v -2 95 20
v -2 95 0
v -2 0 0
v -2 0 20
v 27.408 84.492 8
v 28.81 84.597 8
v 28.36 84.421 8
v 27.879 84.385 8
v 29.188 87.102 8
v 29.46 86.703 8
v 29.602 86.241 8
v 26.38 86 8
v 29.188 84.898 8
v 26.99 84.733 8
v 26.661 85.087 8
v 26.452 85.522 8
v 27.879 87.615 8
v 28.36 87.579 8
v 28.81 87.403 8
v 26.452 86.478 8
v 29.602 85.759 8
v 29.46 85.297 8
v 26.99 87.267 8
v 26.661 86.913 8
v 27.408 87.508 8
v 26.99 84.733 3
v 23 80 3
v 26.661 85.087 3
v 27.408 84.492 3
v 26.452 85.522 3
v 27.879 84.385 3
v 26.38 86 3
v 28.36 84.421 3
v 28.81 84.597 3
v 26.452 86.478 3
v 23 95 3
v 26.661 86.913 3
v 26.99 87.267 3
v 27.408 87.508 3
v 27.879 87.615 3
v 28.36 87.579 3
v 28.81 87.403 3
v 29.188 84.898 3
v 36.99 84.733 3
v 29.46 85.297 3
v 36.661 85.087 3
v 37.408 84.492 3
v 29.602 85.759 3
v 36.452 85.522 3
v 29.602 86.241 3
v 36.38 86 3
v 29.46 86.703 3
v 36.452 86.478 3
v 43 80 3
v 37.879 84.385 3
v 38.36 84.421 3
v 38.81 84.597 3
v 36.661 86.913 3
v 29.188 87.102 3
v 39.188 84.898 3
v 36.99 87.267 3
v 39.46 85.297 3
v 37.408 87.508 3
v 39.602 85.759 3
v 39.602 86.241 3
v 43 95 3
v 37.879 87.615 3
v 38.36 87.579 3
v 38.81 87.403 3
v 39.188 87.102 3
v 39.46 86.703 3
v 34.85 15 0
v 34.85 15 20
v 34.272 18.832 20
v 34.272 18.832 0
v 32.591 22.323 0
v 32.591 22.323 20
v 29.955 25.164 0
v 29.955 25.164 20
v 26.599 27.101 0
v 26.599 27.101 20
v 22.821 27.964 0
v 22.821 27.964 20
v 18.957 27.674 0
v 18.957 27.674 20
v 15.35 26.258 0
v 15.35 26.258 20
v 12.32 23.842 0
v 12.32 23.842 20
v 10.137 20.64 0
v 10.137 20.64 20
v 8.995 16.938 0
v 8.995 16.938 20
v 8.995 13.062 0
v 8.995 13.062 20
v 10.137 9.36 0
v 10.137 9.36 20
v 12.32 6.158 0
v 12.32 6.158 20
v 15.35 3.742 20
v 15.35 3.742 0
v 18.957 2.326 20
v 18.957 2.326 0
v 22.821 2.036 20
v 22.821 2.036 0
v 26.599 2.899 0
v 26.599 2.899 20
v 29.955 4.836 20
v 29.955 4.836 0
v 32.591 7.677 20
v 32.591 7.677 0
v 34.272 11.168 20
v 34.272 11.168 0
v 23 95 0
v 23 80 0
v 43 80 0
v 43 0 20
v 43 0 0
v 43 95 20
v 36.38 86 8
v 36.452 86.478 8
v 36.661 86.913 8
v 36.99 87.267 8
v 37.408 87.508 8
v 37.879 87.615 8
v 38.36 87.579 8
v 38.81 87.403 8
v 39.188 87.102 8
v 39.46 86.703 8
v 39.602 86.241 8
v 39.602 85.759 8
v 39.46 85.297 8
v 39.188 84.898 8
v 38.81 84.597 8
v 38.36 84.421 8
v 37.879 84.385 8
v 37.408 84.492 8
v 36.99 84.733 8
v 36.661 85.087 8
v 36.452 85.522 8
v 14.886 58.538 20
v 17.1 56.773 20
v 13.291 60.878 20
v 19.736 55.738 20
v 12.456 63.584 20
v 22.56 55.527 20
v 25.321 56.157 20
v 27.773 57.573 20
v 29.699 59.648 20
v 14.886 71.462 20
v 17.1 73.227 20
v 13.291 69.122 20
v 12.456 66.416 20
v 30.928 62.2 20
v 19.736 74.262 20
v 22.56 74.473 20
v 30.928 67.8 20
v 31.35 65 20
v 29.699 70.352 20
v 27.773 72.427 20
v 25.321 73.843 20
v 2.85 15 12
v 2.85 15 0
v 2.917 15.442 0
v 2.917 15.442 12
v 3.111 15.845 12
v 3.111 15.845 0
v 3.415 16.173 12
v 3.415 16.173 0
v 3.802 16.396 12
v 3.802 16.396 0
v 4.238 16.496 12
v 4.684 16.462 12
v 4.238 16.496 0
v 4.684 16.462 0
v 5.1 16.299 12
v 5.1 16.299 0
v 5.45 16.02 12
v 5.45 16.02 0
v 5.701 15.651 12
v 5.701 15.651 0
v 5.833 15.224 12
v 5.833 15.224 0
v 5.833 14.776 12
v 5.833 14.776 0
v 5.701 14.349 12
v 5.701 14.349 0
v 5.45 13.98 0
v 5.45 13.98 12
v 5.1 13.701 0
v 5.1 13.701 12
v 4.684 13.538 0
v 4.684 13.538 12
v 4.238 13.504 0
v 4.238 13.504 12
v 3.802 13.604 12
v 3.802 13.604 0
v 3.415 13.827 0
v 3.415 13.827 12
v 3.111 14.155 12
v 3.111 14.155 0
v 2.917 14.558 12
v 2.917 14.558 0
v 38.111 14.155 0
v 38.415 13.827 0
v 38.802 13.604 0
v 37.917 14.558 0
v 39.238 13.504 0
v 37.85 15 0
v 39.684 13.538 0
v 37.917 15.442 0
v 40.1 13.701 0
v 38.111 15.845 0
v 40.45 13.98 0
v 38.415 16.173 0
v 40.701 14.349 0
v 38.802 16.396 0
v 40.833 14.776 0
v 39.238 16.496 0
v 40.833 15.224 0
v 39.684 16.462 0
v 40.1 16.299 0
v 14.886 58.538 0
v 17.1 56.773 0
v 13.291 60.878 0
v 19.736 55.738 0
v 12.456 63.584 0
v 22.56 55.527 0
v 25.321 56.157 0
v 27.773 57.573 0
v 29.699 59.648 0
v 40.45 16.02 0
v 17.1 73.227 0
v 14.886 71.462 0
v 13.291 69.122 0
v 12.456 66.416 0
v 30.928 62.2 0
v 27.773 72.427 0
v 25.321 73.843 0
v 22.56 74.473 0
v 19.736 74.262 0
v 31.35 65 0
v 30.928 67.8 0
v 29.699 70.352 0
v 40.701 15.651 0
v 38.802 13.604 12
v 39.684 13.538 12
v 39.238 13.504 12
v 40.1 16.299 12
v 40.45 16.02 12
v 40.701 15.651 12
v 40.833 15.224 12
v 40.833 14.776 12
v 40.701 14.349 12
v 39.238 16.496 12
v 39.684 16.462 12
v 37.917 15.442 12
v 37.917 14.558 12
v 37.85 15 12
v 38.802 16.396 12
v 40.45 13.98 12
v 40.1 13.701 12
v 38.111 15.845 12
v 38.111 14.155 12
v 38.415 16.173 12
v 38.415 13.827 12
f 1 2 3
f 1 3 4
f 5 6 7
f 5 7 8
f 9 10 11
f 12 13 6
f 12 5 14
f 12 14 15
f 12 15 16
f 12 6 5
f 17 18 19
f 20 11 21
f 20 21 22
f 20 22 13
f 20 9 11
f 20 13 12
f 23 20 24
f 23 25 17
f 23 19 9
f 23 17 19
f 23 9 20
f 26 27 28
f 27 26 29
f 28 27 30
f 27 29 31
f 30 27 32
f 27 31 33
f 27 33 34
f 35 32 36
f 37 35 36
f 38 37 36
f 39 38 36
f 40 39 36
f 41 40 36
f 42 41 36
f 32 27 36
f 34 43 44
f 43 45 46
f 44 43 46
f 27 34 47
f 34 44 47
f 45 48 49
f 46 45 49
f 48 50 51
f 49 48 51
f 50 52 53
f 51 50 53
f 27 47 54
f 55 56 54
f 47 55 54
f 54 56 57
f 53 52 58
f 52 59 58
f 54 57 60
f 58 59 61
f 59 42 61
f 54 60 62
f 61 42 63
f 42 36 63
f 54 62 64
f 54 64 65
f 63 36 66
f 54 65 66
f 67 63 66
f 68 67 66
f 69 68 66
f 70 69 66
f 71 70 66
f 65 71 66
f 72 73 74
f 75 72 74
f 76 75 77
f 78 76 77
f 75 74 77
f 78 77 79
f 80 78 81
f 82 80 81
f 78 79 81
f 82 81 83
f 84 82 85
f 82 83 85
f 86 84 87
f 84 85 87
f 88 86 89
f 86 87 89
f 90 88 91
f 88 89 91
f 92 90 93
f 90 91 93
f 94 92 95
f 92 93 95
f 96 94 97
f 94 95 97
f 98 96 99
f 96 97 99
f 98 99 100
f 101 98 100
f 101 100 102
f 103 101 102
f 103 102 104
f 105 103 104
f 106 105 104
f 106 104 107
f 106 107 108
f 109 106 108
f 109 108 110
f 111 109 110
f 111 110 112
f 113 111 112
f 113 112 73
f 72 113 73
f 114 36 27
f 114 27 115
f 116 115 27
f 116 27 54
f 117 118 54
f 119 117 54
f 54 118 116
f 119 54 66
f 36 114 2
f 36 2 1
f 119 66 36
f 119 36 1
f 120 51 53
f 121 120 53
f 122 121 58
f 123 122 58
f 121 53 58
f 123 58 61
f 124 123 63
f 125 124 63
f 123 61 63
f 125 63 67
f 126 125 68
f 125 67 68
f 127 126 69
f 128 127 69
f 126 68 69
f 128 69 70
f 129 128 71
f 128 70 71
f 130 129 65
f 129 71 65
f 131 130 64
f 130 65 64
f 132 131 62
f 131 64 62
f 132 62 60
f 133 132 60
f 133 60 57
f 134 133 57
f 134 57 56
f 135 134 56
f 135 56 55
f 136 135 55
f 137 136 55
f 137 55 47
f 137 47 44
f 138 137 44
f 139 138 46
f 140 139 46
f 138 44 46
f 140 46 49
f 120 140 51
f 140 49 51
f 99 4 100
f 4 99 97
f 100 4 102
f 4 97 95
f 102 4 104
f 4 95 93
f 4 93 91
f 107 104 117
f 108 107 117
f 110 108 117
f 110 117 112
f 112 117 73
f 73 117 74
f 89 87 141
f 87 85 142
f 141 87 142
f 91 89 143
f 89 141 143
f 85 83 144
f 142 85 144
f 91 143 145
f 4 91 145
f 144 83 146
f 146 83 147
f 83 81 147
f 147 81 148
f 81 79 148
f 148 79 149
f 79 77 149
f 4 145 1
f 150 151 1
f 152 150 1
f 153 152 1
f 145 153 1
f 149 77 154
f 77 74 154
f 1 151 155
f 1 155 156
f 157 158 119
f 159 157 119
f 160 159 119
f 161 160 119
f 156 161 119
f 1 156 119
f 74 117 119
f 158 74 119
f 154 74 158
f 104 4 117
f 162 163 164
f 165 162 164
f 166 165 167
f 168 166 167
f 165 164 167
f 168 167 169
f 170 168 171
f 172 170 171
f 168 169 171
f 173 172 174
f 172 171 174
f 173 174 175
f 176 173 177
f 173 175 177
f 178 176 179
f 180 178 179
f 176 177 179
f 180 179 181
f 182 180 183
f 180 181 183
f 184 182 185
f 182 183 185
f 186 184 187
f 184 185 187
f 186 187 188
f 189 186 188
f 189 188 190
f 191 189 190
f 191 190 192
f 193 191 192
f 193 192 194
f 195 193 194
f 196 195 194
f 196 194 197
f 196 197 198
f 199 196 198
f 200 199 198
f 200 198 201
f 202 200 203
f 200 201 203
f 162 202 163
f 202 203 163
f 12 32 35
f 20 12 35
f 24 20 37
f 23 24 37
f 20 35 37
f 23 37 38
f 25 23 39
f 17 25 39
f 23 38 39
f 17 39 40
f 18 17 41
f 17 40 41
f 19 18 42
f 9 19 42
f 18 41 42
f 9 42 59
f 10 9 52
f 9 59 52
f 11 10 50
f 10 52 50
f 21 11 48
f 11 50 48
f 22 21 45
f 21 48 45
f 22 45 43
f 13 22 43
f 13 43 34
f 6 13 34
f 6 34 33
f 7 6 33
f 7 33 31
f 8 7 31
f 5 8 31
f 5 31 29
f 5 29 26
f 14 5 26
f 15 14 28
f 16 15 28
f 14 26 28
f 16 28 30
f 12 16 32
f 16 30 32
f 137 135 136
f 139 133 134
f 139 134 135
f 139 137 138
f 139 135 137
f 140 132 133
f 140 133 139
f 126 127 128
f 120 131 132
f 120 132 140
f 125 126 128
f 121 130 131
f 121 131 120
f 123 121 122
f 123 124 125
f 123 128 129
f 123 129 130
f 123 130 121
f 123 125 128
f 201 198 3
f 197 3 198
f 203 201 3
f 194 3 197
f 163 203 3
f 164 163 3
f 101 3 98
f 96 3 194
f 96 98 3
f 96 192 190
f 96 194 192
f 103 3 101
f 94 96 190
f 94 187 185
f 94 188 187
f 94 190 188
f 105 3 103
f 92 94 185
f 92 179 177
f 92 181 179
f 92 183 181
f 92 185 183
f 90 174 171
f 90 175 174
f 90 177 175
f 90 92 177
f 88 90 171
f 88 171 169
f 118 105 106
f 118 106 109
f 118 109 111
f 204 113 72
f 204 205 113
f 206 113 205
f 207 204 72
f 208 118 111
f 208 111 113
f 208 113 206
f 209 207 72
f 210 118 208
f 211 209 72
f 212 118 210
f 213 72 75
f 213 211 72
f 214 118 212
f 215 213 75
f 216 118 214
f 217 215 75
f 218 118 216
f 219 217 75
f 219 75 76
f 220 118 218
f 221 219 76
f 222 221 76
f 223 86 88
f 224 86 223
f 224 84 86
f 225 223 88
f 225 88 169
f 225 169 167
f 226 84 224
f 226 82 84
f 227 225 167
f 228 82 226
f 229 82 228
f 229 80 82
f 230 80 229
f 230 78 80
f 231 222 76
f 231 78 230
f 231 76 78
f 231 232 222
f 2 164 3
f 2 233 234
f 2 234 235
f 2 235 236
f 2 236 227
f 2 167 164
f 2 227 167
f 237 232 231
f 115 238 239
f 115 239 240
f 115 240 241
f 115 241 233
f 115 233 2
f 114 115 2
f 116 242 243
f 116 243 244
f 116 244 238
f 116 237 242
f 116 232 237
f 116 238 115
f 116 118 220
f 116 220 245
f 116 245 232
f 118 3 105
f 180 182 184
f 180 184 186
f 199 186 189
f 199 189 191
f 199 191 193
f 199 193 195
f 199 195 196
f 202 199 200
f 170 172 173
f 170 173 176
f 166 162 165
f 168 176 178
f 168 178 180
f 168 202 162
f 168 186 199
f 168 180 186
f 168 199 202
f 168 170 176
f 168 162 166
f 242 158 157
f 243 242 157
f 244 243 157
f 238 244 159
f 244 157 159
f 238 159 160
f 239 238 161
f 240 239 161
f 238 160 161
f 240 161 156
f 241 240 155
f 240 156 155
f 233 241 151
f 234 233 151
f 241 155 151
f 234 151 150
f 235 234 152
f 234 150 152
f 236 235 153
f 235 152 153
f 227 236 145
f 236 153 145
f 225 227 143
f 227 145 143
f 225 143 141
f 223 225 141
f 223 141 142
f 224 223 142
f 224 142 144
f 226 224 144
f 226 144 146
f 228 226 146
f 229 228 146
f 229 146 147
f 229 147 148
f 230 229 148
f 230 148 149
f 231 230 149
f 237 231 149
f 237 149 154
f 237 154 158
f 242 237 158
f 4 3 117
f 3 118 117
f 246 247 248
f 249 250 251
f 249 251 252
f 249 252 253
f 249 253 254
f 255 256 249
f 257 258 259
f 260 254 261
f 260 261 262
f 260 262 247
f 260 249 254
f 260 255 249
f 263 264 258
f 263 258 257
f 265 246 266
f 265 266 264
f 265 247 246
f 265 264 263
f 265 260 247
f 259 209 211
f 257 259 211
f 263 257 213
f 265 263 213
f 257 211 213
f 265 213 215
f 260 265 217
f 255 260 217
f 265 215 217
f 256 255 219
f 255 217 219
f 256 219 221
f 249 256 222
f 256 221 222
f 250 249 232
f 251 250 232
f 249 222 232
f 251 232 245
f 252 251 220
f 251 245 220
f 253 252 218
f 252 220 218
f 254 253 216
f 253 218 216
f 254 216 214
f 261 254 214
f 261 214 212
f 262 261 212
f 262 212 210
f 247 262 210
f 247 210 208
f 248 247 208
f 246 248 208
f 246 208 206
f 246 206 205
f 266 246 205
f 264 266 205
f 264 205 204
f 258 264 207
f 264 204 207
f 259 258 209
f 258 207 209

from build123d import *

# Parameters (mm, degrees)
SKIZZE1_W                       = 43
SKIZZE1_H                       = 95
AUFSATZ_LINEAR_AUSTRAGEN1_DEPTH = 20
SKIZZE2_R                       = 13
SCHNITT_LINEAR_AUSTRAGEN1_DEPTH = 34
SKIZZE3_R                       = 9.5
SCHNITT_LINEAR_AUSTRAGEN2_DEPTH = 34
SKIZZE4_W                       = 20
SKIZZE4_H                       = 3
SCHNITT_LINEAR_AUSTRAGEN3_DEPTH = 15
SKIZZE8_R                       = 1.62
SCHNITT_LINEAR_AUSTRAGEN6_DEPTH = 5
SKIZZE9_R                       = 1.62
SCHNITT_LINEAR_AUSTRAGEN7_DEPTH = 5
SKIZZE10_R                      = 1.5
SCHNITT_LINEAR_AUSTRAGEN8_DEPTH = 12
SKIZZE11_W                      = 20
SKIZZE11_H                      = 95
AUFSATZ_LINEAR_AUSTRAGEN2_DEPTH = 2


with BuildPart() as part:
    # Skizze1 → Aufsatz-Linear austragen1 (new body)
    with BuildSketch(Plane.XY):
        with Locations((21.5, 47.5)):
            Rectangle(SKIZZE1_W, SKIZZE1_H)
    extrude(amount=AUFSATZ_LINEAR_AUSTRAGEN1_DEPTH)

    # Skizze2 → Schnitt-Linear austragen1 (cut)
    with BuildSketch(Plane.XY.offset(20)):
        with Locations((21.85, 15)):
            Circle(SKIZZE2_R)
    extrude(amount=-SCHNITT_LINEAR_AUSTRAGEN1_DEPTH, mode=Mode.SUBTRACT)

    # Skizze3 → Schnitt-Linear austragen2 (cut)
    with BuildSketch(Plane.XY.offset(20)):
        with Locations((21.85, 65)):
            Circle(SKIZZE3_R)
    extrude(amount=-SCHNITT_LINEAR_AUSTRAGEN2_DEPTH, mode=Mode.SUBTRACT)

    # Skizze4 → Schnitt-Linear austragen3 (cut)
    with BuildSketch(Plane(origin=(0, 95, 0), x_dir=(1, 0, 0), z_dir=(0, 1, 0))):
        with Locations((33, -1.5)):
            Rectangle(SKIZZE4_W, SKIZZE4_H)
    extrude(amount=-SCHNITT_LINEAR_AUSTRAGEN3_DEPTH, mode=Mode.SUBTRACT)

    # Skizze8 → Schnitt-Linear austragen6 (cut)
    with BuildSketch(Plane(origin=(0, 0, 3), x_dir=(-1, 0, 0), z_dir=(0, 0, -1))):
        with Locations((-38, 86)):
            Circle(SKIZZE8_R)
    extrude(amount=-SCHNITT_LINEAR_AUSTRAGEN6_DEPTH, mode=Mode.SUBTRACT)

    # Skizze9 → Schnitt-Linear austragen7 (cut)
    with BuildSketch(Plane(origin=(0, 0, 3), x_dir=(-1, 0, 0), z_dir=(0, 0, -1))):
        with Locations((-28, 86)):
            Circle(SKIZZE9_R)
    extrude(amount=-SCHNITT_LINEAR_AUSTRAGEN7_DEPTH, mode=Mode.SUBTRACT)

    # Skizze10 → Schnitt-Linear austragen8 (cut)
    with BuildSketch(Plane(origin=(0, 0, 0), x_dir=(-1, 0, 0), z_dir=(0, 0, -1))):
        with Locations((-4.35, 15)):
            Circle(SKIZZE10_R)
        with Locations((-39.35, 15)):
            Circle(SKIZZE10_R)
    extrude(amount=-SCHNITT_LINEAR_AUSTRAGEN8_DEPTH, mode=Mode.SUBTRACT)

    # Skizze11 → Aufsatz-Linear austragen2 (add)
    with BuildSketch(Plane.ZY):
        with Locations((10, 47.5)):
            Rectangle(SKIZZE11_W, SKIZZE11_H)
    extrude(amount=AUFSATZ_LINEAR_AUSTRAGEN2_DEPTH)


solid = part.part
